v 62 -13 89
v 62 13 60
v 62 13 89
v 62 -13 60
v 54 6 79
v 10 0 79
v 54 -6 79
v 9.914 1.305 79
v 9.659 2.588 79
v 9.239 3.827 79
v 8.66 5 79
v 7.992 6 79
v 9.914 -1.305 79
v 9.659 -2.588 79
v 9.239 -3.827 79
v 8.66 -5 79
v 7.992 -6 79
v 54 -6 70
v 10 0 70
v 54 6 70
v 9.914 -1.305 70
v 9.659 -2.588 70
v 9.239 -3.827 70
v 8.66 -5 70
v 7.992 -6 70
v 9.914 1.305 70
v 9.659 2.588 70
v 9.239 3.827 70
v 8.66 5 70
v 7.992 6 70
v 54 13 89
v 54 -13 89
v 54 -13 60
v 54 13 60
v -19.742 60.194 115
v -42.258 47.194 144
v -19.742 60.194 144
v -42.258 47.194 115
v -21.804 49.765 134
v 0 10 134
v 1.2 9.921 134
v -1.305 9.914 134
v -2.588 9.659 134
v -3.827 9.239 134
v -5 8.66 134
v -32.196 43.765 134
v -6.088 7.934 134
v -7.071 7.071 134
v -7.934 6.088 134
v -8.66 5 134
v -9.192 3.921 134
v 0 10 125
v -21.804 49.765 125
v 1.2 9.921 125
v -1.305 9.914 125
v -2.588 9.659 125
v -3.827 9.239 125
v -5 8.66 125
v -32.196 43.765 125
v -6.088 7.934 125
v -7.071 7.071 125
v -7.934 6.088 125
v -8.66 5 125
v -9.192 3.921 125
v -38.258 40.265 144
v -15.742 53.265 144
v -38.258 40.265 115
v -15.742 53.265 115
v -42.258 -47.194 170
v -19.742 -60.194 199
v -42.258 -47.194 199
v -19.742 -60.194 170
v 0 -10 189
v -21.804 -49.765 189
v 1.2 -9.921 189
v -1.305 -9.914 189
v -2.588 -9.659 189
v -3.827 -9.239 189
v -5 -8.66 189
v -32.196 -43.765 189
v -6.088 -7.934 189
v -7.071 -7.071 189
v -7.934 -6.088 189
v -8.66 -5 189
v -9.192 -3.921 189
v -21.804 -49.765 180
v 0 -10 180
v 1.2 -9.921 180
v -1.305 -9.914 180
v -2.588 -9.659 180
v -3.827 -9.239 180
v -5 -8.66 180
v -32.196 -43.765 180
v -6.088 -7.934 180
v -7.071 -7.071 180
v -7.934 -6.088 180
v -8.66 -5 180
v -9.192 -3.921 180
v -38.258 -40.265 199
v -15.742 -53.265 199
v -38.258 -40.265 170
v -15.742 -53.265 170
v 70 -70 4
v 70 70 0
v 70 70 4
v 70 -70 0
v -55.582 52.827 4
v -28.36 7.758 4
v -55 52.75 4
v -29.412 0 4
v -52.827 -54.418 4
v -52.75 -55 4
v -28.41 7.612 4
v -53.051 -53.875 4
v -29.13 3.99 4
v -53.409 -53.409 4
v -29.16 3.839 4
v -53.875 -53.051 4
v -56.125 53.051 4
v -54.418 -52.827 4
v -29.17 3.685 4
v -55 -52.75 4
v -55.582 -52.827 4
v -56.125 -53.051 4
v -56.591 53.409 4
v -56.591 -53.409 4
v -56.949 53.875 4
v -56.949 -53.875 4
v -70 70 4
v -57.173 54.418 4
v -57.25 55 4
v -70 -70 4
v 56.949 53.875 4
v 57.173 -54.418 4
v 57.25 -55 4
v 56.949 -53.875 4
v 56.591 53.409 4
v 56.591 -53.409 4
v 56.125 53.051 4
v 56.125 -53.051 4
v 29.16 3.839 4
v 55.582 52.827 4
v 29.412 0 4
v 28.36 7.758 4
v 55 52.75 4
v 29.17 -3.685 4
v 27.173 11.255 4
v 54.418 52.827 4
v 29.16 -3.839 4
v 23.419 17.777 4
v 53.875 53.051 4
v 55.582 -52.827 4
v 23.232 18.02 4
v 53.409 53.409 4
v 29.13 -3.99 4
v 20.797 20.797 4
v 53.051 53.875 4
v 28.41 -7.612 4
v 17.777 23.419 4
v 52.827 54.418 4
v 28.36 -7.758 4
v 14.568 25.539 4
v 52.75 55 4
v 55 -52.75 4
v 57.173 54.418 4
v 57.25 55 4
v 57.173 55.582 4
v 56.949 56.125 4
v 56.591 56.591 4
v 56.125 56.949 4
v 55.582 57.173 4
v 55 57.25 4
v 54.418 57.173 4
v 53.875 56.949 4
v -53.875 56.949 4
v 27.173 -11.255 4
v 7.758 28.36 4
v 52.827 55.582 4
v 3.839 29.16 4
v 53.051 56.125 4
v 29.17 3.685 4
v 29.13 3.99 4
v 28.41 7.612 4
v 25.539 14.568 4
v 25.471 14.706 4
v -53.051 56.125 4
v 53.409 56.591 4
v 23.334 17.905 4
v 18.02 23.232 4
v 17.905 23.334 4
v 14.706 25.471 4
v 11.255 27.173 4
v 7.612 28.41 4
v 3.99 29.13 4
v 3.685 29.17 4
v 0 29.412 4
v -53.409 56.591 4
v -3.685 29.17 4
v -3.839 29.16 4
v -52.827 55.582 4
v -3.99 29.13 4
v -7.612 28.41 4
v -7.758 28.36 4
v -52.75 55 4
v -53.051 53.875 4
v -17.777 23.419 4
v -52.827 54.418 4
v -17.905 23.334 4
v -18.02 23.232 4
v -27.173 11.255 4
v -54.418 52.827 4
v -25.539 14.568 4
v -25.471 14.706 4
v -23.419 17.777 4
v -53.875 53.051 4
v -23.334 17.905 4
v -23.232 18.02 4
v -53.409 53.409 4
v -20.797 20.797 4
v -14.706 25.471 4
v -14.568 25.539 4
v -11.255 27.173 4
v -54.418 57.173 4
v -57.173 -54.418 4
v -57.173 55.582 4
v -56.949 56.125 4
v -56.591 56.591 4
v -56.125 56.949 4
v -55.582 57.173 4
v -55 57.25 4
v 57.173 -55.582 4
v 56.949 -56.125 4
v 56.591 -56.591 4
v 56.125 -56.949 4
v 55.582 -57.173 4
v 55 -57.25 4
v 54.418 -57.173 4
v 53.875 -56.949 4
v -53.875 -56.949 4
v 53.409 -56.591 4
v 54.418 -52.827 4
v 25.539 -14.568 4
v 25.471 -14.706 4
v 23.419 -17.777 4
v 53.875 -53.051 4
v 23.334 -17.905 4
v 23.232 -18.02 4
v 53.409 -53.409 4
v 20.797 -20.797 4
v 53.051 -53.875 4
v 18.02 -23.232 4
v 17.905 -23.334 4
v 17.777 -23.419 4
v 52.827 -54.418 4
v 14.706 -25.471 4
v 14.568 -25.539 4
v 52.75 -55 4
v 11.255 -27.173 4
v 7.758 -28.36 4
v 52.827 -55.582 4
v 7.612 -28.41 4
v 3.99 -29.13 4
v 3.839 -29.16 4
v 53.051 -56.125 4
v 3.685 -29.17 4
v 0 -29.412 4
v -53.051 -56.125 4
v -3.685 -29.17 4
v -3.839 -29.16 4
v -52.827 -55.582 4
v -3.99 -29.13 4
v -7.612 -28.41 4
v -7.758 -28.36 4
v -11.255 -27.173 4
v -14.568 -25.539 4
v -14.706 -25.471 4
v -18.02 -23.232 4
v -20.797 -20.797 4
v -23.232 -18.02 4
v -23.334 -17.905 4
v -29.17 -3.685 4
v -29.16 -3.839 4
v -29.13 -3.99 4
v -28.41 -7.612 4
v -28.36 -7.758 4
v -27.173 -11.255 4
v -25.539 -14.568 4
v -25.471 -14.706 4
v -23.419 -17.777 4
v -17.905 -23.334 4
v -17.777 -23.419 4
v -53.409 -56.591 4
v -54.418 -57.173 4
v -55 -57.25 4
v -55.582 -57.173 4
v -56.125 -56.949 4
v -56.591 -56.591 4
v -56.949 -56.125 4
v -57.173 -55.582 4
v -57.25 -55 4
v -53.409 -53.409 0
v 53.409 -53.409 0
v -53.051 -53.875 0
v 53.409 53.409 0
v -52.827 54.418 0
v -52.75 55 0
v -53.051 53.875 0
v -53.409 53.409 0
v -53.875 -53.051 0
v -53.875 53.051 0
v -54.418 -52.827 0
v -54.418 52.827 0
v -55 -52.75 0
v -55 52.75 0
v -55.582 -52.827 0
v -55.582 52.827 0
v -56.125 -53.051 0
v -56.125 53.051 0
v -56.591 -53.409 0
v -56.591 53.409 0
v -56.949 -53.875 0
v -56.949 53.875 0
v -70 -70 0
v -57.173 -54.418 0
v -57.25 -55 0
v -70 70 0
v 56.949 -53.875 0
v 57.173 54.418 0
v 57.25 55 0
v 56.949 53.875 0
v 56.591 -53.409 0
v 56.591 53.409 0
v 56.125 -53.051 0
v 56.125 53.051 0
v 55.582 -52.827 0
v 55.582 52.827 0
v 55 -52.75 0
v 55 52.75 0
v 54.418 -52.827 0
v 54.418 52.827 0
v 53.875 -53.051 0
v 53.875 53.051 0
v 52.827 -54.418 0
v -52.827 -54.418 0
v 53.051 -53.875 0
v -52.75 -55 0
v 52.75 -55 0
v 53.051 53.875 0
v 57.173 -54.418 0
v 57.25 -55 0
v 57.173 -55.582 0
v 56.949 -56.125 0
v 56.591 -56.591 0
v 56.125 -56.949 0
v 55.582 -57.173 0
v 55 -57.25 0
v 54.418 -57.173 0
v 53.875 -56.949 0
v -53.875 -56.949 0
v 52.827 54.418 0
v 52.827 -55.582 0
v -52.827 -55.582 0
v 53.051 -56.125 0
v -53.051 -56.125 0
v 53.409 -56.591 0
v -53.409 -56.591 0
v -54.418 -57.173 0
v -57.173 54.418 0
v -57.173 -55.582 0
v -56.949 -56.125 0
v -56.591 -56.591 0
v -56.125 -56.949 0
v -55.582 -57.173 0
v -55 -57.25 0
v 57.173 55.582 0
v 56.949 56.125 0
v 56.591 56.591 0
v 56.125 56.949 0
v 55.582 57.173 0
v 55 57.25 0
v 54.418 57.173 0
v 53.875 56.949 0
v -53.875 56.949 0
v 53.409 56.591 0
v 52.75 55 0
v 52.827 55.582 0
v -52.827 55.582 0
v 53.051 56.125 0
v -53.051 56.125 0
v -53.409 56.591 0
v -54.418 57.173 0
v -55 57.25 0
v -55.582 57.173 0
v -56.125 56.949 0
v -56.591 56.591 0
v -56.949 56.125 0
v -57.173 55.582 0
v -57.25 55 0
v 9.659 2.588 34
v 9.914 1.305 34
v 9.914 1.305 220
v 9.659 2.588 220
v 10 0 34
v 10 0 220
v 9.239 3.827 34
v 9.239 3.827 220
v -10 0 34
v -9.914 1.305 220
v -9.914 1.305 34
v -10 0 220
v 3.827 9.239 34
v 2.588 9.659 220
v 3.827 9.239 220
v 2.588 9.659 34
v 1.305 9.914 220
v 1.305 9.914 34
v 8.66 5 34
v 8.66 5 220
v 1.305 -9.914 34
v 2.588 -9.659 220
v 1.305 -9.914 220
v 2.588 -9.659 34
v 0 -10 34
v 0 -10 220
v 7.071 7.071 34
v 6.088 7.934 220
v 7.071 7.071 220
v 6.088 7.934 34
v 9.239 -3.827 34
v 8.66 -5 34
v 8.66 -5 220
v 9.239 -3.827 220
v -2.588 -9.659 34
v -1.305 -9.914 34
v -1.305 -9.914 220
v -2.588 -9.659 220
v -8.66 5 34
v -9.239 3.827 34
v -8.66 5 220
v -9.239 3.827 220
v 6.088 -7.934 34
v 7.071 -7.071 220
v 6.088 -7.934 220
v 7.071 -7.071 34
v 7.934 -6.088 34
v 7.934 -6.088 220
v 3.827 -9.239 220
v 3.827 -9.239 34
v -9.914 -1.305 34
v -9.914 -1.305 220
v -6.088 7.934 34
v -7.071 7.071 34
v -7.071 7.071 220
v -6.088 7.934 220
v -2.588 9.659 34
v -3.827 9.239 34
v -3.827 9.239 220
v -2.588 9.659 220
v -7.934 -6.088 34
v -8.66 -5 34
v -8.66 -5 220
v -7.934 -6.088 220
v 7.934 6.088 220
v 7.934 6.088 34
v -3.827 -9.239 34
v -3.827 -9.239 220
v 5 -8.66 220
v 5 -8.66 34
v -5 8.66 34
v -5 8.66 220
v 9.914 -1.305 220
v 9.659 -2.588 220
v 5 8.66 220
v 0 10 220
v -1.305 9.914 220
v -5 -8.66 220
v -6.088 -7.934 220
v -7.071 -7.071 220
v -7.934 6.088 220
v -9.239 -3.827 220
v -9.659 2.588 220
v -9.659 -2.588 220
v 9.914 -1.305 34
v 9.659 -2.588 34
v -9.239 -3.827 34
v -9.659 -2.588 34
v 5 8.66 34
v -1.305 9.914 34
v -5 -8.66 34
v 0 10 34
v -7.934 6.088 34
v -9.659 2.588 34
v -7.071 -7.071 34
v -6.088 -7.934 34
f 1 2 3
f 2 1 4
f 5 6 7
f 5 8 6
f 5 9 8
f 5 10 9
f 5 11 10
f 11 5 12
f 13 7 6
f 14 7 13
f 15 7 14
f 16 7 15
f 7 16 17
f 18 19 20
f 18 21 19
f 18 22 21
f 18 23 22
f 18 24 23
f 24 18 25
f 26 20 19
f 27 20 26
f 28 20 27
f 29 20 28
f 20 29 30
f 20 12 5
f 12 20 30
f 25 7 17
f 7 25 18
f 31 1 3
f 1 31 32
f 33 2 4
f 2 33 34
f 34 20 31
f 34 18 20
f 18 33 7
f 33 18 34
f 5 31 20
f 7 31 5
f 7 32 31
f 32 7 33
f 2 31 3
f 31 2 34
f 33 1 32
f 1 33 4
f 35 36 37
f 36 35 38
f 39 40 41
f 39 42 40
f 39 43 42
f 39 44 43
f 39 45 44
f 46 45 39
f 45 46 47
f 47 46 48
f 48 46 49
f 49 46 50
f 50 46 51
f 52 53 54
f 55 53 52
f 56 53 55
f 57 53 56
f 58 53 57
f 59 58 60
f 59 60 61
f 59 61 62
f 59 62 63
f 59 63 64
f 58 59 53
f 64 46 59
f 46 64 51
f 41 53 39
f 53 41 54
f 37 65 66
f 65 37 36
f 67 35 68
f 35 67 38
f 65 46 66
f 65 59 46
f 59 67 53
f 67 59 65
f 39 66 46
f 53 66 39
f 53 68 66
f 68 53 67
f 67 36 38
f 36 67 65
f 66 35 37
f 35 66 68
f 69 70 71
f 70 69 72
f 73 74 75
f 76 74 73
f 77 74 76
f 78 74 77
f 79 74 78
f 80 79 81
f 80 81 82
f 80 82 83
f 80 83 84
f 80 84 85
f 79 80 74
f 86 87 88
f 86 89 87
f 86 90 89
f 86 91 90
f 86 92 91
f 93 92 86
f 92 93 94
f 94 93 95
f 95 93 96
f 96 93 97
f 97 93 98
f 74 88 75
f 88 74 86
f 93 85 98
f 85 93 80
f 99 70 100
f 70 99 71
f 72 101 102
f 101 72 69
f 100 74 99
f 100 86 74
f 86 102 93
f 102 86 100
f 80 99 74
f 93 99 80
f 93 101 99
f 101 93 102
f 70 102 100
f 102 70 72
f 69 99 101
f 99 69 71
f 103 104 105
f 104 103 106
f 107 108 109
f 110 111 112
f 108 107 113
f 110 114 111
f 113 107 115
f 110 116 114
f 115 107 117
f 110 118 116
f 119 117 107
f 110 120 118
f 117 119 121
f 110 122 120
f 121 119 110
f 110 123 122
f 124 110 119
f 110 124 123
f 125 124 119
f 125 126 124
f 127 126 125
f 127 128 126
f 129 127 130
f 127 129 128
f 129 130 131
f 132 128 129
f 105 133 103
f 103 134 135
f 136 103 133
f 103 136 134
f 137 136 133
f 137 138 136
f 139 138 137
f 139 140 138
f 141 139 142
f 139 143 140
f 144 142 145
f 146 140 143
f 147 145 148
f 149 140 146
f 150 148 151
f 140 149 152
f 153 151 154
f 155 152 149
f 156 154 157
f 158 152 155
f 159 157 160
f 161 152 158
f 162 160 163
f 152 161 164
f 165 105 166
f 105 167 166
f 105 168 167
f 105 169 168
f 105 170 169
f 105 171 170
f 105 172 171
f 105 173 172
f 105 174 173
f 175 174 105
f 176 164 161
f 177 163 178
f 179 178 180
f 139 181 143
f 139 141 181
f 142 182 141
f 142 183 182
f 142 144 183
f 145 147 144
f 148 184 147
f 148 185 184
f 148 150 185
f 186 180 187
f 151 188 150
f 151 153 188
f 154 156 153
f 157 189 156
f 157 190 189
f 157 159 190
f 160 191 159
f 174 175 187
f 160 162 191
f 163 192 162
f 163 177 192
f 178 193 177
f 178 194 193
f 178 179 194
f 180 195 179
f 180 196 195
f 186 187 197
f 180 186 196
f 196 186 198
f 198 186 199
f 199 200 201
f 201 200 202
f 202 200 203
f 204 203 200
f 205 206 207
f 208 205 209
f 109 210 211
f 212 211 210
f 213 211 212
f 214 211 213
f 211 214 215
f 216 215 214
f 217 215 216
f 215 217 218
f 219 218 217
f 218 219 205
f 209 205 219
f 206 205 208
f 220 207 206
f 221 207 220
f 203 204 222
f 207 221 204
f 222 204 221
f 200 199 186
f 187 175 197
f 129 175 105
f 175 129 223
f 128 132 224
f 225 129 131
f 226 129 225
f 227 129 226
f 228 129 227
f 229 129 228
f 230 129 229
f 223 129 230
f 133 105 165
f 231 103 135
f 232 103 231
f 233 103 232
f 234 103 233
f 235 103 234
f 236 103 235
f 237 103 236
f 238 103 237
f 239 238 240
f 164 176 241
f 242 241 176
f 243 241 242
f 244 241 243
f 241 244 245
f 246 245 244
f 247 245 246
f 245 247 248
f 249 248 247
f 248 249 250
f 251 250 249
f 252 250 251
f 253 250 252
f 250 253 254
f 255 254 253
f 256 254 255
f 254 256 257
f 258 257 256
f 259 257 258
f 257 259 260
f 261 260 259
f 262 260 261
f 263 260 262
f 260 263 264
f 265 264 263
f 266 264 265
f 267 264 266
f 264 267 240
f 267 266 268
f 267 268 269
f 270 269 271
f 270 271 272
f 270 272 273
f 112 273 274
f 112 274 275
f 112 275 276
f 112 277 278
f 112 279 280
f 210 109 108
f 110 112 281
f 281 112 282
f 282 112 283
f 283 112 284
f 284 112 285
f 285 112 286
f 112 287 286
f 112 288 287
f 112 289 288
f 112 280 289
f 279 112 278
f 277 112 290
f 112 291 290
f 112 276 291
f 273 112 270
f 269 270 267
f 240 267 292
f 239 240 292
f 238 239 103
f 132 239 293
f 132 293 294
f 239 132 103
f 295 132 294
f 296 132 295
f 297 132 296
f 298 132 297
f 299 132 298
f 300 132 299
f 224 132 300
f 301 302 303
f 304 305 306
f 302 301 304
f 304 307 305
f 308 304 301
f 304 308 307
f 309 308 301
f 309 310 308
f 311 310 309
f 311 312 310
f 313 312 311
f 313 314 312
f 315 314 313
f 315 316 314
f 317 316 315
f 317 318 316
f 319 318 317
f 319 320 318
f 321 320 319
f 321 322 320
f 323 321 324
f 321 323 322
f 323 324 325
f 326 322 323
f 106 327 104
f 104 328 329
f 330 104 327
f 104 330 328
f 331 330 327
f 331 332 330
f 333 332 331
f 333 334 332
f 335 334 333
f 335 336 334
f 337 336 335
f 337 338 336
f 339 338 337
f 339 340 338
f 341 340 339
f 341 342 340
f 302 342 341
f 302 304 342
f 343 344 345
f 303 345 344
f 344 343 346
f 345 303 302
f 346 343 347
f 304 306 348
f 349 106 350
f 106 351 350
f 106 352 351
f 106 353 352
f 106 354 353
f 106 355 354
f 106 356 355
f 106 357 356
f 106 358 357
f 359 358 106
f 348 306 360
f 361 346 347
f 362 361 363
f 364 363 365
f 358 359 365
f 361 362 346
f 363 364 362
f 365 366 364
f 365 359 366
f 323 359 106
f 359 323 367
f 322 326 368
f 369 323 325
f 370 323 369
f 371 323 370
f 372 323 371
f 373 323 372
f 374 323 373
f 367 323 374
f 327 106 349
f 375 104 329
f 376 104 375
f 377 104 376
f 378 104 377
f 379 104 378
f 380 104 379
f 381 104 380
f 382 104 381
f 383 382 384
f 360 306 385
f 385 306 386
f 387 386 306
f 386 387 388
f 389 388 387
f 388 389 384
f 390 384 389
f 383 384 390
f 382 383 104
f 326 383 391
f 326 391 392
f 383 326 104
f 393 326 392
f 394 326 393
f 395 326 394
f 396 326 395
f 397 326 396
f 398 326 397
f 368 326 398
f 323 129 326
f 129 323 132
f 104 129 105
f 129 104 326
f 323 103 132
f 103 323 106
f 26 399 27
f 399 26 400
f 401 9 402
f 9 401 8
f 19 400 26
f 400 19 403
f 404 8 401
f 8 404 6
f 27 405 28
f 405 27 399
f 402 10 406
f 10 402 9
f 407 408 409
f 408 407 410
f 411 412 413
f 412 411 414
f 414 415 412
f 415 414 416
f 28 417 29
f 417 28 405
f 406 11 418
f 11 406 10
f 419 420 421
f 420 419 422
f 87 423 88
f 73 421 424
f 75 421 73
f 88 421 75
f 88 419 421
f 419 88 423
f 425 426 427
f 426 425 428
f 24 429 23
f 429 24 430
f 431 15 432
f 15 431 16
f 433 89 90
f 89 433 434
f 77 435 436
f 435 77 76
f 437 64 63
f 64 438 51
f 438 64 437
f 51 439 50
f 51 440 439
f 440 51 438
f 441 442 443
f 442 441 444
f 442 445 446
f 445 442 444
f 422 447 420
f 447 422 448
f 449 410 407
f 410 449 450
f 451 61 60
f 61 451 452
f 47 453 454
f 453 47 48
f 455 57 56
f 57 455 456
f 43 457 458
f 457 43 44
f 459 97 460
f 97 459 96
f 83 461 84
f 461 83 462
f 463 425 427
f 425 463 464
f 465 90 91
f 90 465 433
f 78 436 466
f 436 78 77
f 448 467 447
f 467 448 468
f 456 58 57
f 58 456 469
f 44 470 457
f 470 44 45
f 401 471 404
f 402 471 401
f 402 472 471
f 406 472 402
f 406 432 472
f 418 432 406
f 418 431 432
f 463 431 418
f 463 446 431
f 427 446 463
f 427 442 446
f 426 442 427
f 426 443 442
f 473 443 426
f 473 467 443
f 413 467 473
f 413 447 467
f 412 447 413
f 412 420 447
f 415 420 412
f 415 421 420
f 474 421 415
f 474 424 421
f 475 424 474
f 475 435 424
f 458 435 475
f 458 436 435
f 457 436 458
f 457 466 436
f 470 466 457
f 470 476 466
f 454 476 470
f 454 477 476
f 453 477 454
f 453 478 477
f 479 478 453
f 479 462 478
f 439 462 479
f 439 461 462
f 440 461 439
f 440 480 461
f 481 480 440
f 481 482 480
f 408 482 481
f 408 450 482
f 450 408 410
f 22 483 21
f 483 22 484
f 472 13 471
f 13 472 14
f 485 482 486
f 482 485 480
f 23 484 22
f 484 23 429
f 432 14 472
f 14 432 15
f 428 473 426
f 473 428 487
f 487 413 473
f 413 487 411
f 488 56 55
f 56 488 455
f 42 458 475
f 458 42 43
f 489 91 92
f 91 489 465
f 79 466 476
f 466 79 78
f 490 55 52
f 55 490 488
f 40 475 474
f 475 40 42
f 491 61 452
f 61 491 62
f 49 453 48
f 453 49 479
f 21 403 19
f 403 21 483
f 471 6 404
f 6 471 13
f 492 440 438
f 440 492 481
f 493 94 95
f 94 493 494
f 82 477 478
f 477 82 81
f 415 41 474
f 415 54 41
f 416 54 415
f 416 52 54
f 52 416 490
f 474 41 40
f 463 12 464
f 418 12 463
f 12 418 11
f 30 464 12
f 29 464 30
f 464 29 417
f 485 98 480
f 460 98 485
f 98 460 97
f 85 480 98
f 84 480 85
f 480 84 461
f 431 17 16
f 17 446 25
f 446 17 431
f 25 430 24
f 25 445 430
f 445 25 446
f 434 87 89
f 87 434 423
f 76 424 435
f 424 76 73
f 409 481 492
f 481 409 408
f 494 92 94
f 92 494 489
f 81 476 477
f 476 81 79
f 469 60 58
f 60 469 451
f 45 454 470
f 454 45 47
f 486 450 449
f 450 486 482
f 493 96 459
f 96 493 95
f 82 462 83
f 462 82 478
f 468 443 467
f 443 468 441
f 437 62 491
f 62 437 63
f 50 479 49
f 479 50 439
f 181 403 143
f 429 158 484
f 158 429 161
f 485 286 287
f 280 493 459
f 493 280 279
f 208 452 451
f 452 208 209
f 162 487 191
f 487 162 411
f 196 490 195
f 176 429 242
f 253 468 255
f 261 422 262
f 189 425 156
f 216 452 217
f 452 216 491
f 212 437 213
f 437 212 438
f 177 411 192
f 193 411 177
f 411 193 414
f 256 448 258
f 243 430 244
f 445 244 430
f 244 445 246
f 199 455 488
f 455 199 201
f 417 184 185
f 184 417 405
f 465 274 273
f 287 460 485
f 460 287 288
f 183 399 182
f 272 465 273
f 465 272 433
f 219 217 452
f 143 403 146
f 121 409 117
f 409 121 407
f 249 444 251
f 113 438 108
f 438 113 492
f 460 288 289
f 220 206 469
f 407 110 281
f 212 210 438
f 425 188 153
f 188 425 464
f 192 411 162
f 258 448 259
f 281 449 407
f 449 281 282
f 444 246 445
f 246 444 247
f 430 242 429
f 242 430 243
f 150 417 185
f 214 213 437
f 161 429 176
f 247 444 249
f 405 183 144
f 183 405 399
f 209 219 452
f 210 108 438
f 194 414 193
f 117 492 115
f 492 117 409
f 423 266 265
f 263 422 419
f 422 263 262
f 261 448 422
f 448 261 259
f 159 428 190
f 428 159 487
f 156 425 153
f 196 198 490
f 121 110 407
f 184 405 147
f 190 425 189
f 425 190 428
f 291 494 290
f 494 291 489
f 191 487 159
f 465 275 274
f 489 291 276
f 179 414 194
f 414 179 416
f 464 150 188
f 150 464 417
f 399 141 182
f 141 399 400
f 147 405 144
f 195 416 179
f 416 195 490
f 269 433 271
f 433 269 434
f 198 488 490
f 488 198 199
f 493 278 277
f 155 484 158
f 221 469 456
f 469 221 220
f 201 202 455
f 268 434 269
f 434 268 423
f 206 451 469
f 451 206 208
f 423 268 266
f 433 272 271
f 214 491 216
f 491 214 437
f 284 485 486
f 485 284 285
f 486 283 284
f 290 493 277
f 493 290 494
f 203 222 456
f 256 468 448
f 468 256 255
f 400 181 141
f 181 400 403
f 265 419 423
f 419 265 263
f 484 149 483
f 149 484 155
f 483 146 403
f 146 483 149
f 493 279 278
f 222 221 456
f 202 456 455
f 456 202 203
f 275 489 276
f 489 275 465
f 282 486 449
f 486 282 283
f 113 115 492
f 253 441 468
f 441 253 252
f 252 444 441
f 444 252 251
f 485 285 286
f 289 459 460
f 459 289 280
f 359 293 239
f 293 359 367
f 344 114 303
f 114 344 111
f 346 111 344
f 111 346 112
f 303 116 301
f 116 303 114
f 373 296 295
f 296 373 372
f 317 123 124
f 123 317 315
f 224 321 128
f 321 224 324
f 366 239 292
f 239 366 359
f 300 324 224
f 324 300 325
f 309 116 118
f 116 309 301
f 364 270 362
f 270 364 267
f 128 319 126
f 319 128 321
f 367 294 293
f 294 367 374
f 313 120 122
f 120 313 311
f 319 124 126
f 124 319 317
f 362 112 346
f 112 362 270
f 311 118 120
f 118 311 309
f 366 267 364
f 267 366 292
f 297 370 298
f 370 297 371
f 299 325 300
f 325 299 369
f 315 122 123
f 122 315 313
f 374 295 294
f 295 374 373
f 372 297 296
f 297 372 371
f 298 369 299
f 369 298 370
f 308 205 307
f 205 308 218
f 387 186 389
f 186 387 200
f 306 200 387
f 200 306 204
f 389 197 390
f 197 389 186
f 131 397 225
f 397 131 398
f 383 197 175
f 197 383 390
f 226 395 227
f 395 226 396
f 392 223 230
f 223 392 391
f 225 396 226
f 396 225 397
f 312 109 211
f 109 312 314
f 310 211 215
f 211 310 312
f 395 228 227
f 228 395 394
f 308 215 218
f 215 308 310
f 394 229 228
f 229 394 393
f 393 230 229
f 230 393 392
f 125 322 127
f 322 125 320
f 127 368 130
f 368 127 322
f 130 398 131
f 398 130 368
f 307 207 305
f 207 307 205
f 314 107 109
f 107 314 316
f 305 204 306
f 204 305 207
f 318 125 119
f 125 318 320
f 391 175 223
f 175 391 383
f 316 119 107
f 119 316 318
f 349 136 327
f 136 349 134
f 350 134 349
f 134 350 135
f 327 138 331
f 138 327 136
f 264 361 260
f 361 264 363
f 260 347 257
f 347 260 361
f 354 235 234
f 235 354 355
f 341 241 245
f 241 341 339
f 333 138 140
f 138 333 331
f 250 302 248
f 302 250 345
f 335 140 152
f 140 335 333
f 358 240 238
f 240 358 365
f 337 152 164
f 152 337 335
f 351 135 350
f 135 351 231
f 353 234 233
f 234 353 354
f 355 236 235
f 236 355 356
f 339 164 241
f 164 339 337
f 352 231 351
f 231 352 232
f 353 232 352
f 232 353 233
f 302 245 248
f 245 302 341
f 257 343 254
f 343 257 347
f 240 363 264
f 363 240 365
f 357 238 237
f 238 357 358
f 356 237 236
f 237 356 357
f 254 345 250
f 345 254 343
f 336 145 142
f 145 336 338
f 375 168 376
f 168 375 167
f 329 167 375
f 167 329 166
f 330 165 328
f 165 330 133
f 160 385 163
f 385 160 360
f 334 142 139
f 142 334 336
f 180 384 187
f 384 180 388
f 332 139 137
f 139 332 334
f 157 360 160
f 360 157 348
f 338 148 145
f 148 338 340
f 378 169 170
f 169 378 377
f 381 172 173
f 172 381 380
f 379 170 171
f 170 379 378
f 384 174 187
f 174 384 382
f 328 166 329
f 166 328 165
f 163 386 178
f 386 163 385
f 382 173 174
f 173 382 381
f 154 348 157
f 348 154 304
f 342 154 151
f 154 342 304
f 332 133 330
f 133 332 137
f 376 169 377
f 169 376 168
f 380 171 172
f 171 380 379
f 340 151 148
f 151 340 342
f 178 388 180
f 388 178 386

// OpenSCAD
// file: ../models/drone-playground-orbit-tower/model.scad
tower_height=220; base_size=140; post_diameter=20; flag_radius=62; mount_hole_diameter=4.5;
module orbit_tower(){ difference(){ union(){ translate([-base_size/2,-base_size/2,0]) cube([base_size,base_size,4]); cylinder(d=post_diameter,h=tower_height,$fn=48); cylinder(d1=64,d2=post_diameter,h=34,$fn=48); for(i=[0:2]) rotate([0,0,i*120]) translate([0,-6,70+i*55]) { cube([flag_radius,12,9]); translate([flag_radius-8,-7,-10]) cube([8,26,29]); } } for(x=[-55,55],y=[-55,55]) translate([x,y,-1]) cylinder(d=mount_hole_diameter,h=7,$fn=24); }}
assert(tower_height==220 && flag_radius>base_size/3); echo("SCADCTL_REQUIREMENT:parameters:PASS"); orbit_tower();
// main file
use <../models/drone-playground-orbit-tower/model.scad>
color("limegreen") orbit_tower();
